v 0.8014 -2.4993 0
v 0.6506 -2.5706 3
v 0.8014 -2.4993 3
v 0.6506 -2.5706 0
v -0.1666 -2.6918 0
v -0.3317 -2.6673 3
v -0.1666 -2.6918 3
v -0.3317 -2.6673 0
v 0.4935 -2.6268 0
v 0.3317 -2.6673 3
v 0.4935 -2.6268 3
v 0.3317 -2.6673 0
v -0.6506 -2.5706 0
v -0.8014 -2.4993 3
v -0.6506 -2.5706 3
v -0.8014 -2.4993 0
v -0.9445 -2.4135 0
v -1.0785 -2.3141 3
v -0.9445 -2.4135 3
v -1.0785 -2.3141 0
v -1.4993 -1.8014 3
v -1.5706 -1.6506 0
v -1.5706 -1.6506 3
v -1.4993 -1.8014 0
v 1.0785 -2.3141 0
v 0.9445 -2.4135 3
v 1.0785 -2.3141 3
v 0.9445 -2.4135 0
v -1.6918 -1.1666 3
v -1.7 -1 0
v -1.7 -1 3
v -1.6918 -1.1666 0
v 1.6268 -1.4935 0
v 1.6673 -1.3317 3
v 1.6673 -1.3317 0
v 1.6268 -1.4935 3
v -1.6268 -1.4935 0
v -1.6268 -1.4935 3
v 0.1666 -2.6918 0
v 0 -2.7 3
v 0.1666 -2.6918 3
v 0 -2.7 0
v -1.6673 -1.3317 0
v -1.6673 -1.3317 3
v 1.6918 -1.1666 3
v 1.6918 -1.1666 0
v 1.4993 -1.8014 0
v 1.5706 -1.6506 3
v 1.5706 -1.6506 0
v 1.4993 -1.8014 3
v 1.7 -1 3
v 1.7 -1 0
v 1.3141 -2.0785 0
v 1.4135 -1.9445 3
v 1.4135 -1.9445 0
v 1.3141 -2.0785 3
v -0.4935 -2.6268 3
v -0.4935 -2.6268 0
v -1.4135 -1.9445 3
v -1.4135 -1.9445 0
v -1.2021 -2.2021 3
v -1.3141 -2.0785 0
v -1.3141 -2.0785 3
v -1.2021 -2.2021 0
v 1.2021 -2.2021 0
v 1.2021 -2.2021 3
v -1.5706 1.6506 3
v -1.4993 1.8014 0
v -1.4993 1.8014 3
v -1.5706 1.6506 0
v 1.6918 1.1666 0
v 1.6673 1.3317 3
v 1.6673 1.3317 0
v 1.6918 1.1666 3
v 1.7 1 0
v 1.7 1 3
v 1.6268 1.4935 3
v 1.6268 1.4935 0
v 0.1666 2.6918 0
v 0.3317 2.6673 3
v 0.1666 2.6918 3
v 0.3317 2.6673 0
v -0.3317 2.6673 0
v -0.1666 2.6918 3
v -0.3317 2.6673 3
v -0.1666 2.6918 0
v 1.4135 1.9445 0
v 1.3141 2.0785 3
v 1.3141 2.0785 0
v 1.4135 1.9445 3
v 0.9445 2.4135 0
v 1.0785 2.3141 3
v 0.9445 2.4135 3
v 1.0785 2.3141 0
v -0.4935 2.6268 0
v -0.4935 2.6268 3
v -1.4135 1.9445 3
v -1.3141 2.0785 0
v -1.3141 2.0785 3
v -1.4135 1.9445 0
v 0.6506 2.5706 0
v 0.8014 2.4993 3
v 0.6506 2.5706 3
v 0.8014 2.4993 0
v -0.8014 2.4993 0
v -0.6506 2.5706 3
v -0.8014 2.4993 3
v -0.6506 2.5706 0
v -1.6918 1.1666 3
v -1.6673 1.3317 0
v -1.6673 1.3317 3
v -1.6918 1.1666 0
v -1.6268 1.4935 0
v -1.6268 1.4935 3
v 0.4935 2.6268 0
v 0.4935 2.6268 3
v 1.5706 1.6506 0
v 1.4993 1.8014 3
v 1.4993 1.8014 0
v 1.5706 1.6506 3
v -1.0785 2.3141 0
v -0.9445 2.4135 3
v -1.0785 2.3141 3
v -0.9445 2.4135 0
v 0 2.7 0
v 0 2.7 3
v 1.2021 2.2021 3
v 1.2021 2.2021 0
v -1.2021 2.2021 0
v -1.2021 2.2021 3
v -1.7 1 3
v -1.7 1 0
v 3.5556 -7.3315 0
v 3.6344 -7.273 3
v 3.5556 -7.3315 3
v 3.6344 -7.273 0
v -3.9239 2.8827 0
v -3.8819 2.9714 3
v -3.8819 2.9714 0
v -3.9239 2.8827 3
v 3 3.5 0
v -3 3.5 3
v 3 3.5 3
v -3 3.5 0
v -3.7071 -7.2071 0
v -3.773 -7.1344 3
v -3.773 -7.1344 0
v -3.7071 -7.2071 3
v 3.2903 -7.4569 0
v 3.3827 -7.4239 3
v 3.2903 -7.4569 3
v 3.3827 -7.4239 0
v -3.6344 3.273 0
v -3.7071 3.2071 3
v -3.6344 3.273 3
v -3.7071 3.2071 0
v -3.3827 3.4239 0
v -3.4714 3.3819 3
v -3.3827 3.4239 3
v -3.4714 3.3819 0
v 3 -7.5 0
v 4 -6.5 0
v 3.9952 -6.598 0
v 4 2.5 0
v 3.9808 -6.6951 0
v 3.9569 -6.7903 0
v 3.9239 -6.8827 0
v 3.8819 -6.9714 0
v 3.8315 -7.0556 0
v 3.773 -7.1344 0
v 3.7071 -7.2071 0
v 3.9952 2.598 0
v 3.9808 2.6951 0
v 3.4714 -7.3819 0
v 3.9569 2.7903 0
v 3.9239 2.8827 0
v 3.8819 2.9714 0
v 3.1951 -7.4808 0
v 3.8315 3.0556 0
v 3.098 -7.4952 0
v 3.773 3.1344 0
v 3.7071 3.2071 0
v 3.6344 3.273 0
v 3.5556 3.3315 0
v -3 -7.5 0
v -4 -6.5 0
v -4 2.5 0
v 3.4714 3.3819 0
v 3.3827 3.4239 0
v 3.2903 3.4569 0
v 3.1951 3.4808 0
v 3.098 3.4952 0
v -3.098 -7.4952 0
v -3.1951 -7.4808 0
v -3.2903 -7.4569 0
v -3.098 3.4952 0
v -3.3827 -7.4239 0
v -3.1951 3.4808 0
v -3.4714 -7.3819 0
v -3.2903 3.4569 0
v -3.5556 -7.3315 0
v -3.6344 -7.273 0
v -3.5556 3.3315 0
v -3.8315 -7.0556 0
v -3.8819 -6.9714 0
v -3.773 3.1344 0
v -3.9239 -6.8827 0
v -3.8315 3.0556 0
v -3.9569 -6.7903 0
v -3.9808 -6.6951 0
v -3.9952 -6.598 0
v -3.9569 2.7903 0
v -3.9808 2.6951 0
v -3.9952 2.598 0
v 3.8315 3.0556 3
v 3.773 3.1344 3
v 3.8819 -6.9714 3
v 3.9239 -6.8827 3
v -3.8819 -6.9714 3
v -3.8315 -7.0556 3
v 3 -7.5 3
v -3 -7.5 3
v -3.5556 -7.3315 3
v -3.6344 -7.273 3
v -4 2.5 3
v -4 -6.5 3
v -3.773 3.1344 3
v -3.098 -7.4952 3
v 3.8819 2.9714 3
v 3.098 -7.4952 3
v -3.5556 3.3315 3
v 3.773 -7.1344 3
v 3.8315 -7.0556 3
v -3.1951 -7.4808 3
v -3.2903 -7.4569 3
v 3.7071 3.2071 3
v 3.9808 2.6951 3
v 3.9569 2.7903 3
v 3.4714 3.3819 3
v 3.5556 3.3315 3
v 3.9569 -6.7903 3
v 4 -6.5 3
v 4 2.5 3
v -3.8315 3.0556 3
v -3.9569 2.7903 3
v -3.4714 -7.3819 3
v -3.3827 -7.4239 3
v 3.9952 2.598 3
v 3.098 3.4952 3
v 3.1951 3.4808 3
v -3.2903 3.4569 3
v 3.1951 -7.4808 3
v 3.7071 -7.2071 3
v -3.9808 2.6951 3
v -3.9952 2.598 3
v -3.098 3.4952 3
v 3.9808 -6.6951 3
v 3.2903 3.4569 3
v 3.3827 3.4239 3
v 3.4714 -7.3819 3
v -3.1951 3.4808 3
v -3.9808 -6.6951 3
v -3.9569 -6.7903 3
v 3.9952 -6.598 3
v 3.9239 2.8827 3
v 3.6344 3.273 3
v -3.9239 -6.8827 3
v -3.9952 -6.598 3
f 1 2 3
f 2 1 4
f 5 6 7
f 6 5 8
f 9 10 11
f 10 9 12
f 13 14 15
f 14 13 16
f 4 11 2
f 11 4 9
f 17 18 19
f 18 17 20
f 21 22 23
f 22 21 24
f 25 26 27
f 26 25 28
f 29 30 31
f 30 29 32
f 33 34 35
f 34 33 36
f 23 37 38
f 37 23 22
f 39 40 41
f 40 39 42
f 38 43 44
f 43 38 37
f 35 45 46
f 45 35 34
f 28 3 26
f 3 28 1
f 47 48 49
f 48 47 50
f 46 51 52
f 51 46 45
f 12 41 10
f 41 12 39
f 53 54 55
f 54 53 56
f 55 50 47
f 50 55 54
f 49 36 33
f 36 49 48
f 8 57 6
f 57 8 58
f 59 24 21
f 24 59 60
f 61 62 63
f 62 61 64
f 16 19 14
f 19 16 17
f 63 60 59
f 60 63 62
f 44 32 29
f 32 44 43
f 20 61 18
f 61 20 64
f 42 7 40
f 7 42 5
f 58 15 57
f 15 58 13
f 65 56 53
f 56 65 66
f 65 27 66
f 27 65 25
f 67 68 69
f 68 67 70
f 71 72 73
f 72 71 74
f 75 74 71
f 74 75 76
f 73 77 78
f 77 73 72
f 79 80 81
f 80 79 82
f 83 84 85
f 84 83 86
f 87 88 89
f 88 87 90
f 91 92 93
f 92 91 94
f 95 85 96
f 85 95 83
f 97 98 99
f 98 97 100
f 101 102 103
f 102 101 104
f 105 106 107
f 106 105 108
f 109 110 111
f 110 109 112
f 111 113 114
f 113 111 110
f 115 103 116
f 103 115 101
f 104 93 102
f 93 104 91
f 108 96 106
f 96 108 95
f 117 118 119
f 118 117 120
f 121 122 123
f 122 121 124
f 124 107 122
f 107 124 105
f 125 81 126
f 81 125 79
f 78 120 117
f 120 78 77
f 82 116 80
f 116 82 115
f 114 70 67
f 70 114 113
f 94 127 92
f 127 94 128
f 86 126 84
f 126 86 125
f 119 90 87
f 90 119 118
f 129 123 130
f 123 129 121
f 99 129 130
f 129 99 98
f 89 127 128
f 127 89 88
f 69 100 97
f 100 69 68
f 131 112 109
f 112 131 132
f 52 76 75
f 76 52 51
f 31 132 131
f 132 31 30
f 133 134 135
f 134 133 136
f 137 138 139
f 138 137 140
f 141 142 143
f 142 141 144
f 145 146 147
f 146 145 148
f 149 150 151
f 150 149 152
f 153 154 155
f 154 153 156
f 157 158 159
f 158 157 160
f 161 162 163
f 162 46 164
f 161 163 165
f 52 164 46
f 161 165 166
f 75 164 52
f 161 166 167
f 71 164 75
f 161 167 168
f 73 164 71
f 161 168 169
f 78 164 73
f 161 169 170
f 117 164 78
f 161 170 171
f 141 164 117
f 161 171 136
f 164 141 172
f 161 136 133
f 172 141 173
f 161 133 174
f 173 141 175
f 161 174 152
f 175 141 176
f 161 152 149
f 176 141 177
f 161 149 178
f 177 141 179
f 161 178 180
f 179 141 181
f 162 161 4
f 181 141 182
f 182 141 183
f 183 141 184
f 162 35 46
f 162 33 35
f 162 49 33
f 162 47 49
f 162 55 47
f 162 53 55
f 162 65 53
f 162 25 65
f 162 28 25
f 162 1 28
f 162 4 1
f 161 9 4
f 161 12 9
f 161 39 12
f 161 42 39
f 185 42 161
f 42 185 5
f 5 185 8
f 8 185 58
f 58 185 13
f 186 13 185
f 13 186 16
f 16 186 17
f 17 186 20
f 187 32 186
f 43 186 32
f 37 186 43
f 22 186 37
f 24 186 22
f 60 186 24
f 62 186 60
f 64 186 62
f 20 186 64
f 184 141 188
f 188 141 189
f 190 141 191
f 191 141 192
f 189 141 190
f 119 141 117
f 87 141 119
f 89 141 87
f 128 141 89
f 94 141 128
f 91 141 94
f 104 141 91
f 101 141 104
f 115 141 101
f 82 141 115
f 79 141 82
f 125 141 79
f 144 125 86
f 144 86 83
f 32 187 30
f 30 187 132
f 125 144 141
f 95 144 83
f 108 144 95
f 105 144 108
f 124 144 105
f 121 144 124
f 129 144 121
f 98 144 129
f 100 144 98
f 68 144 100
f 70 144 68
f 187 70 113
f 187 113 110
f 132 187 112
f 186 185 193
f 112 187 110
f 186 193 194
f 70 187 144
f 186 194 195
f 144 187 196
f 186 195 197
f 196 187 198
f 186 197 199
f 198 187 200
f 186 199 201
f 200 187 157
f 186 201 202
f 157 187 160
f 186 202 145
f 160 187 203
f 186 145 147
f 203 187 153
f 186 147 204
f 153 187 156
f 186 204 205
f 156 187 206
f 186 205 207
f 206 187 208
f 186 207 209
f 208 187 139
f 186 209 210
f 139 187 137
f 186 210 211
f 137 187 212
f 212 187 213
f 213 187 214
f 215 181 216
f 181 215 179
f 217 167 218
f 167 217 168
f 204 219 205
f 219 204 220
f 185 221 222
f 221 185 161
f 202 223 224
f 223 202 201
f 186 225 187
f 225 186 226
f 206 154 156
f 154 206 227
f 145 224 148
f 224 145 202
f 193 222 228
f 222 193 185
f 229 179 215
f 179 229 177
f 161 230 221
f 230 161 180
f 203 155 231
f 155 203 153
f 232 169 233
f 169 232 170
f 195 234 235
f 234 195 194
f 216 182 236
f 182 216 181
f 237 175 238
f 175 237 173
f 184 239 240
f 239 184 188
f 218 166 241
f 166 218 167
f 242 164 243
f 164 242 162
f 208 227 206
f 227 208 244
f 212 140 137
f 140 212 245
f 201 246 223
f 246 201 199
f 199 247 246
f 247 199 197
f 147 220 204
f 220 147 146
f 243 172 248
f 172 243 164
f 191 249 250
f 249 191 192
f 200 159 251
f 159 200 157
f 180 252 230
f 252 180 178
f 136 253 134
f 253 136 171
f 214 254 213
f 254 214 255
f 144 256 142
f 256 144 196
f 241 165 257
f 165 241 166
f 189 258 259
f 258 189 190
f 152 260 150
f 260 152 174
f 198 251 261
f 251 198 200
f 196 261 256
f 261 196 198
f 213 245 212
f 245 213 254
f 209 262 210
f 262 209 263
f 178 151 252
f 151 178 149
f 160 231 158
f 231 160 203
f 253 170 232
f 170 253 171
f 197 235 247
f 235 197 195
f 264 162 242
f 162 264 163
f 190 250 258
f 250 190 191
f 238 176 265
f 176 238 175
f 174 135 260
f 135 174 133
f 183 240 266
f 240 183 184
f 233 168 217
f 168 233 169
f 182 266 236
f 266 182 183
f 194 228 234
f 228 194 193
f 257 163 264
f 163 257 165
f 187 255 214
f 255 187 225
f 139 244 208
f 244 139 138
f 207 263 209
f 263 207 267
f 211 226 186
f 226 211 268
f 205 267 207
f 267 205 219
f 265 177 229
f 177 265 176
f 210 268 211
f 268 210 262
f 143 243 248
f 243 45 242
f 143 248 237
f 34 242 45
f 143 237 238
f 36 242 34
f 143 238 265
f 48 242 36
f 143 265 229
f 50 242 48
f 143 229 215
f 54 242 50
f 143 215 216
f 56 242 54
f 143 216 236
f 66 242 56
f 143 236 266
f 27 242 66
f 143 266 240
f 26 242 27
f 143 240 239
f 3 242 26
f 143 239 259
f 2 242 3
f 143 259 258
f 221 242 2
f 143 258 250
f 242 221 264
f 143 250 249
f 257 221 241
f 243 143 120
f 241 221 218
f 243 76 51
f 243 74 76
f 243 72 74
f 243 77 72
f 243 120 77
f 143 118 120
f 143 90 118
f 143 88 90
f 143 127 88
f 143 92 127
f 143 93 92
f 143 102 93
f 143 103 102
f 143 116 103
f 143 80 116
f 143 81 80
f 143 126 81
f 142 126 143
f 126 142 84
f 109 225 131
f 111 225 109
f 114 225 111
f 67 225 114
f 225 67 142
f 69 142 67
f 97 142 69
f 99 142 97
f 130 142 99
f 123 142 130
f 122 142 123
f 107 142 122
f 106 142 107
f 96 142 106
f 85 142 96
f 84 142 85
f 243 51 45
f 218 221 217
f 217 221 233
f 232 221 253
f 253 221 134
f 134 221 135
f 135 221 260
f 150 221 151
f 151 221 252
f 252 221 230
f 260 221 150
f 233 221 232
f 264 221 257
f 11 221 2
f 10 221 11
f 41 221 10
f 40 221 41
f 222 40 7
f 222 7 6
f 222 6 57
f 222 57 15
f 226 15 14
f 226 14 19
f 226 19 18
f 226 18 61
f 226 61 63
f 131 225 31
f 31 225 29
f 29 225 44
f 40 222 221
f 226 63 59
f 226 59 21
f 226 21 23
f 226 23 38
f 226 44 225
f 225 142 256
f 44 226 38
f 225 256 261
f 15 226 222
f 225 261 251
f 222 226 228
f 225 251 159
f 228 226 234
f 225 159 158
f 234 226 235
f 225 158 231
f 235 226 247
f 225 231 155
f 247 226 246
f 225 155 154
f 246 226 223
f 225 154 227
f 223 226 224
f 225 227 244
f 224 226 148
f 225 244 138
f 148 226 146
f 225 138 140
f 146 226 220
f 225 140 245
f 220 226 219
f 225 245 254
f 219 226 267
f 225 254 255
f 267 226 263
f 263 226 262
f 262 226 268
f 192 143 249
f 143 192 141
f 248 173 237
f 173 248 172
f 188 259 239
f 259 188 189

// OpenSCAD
// Screwless v2; mm; generated by generate_screwless_v2.py
difference(){translate([0,-2,0]){linear_extrude(height=3)polygon(points=[[4.0, 4.5], [3.995184726672197, 4.598017140329561], [3.9807852804032304, 4.695090322016128], [3.9569403357322086, 4.790284677254462], [3.923879532511287, 4.88268343236509], [3.881921264348355, 4.971396736825998], [3.8314696123025453, 5.055570233019602], [3.773010453362737, 5.134393284163646], [3.7071067811865475, 5.207106781186548], [3.6343932841636457, 5.273010453362737], [3.555570233019602, 5.331469612302545], [3.4713967368259975, 5.381921264348355], [3.3826834323650896, 5.423879532511287], [3.2902846772544625, 5.456940335732209], [3.1950903220161284, 5.48078528040323], [3.0980171403295604, 5.495184726672197], [3.0, 5.5], [-3.0, 5.5], [-3.0980171403295604, 5.495184726672197], [-3.195090322016128, 5.48078528040323], [-3.2902846772544625, 5.456940335732209], [-3.3826834323650896, 5.423879532511287], [-3.471396736825998, 5.381921264348355], [-3.555570233019602, 5.331469612302545], [-3.6343932841636453, 5.273010453362737], [-3.7071067811865475, 5.207106781186548], [-3.773010453362737, 5.134393284163646], [-3.8314696123025453, 5.055570233019602], [-3.881921264348355, 4.971396736825998], [-3.923879532511287, 4.88268343236509], [-3.9569403357322086, 4.790284677254462], [-3.9807852804032304, 4.695090322016128], [-3.9951847266721967, 4.598017140329561], [-4.0, 4.5], [-4.0, -4.5], [-3.995184726672197, -4.598017140329561], [-3.9807852804032304, -4.695090322016128], [-3.956940335732209, -4.790284677254462], [-3.923879532511287, -4.88268343236509], [-3.881921264348355, -4.971396736825998], [-3.8314696123025453, -5.055570233019602], [-3.773010453362737, -5.134393284163645], [-3.707106781186548, -5.207106781186548], [-3.6343932841636457, -5.273010453362737], [-3.555570233019602, -5.331469612302545], [-3.471396736825998, -5.381921264348355], [-3.3826834323650896, -5.423879532511287], [-3.2902846772544625, -5.456940335732209], [-3.195090322016129, -5.48078528040323], [-3.0980171403295604, -5.495184726672197], [-3.0, -5.5], [3.0, -5.5], [3.09801714032956, -5.495184726672197], [3.1950903220161284, -5.48078528040323], [3.290284677254462, -5.456940335732209], [3.38268343236509, -5.423879532511287], [3.4713967368259975, -5.381921264348355], [3.5555702330196017, -5.331469612302546], [3.6343932841636457, -5.273010453362737], [3.7071067811865475, -5.207106781186548], [3.7730104533627373, -5.134393284163645], [3.8314696123025453, -5.055570233019602], [3.881921264348355, -4.971396736825998], [3.923879532511287, -4.88268343236509], [3.9569403357322086, -4.790284677254462], [3.9807852804032304, -4.695090322016129], [3.995184726672197, -4.598017140329561], [4.0, -4.5]]);}union(){union(){translate([0,-1,-1]){cylinder(h=5,r=1.7,$fn=64);}translate([0,1,-1]){cylinder(h=5,r=1.7,$fn=64);}}translate([0,0,-1]){translate([-1.7,-1.0,0])cube([3.4,2,5]);}}}
